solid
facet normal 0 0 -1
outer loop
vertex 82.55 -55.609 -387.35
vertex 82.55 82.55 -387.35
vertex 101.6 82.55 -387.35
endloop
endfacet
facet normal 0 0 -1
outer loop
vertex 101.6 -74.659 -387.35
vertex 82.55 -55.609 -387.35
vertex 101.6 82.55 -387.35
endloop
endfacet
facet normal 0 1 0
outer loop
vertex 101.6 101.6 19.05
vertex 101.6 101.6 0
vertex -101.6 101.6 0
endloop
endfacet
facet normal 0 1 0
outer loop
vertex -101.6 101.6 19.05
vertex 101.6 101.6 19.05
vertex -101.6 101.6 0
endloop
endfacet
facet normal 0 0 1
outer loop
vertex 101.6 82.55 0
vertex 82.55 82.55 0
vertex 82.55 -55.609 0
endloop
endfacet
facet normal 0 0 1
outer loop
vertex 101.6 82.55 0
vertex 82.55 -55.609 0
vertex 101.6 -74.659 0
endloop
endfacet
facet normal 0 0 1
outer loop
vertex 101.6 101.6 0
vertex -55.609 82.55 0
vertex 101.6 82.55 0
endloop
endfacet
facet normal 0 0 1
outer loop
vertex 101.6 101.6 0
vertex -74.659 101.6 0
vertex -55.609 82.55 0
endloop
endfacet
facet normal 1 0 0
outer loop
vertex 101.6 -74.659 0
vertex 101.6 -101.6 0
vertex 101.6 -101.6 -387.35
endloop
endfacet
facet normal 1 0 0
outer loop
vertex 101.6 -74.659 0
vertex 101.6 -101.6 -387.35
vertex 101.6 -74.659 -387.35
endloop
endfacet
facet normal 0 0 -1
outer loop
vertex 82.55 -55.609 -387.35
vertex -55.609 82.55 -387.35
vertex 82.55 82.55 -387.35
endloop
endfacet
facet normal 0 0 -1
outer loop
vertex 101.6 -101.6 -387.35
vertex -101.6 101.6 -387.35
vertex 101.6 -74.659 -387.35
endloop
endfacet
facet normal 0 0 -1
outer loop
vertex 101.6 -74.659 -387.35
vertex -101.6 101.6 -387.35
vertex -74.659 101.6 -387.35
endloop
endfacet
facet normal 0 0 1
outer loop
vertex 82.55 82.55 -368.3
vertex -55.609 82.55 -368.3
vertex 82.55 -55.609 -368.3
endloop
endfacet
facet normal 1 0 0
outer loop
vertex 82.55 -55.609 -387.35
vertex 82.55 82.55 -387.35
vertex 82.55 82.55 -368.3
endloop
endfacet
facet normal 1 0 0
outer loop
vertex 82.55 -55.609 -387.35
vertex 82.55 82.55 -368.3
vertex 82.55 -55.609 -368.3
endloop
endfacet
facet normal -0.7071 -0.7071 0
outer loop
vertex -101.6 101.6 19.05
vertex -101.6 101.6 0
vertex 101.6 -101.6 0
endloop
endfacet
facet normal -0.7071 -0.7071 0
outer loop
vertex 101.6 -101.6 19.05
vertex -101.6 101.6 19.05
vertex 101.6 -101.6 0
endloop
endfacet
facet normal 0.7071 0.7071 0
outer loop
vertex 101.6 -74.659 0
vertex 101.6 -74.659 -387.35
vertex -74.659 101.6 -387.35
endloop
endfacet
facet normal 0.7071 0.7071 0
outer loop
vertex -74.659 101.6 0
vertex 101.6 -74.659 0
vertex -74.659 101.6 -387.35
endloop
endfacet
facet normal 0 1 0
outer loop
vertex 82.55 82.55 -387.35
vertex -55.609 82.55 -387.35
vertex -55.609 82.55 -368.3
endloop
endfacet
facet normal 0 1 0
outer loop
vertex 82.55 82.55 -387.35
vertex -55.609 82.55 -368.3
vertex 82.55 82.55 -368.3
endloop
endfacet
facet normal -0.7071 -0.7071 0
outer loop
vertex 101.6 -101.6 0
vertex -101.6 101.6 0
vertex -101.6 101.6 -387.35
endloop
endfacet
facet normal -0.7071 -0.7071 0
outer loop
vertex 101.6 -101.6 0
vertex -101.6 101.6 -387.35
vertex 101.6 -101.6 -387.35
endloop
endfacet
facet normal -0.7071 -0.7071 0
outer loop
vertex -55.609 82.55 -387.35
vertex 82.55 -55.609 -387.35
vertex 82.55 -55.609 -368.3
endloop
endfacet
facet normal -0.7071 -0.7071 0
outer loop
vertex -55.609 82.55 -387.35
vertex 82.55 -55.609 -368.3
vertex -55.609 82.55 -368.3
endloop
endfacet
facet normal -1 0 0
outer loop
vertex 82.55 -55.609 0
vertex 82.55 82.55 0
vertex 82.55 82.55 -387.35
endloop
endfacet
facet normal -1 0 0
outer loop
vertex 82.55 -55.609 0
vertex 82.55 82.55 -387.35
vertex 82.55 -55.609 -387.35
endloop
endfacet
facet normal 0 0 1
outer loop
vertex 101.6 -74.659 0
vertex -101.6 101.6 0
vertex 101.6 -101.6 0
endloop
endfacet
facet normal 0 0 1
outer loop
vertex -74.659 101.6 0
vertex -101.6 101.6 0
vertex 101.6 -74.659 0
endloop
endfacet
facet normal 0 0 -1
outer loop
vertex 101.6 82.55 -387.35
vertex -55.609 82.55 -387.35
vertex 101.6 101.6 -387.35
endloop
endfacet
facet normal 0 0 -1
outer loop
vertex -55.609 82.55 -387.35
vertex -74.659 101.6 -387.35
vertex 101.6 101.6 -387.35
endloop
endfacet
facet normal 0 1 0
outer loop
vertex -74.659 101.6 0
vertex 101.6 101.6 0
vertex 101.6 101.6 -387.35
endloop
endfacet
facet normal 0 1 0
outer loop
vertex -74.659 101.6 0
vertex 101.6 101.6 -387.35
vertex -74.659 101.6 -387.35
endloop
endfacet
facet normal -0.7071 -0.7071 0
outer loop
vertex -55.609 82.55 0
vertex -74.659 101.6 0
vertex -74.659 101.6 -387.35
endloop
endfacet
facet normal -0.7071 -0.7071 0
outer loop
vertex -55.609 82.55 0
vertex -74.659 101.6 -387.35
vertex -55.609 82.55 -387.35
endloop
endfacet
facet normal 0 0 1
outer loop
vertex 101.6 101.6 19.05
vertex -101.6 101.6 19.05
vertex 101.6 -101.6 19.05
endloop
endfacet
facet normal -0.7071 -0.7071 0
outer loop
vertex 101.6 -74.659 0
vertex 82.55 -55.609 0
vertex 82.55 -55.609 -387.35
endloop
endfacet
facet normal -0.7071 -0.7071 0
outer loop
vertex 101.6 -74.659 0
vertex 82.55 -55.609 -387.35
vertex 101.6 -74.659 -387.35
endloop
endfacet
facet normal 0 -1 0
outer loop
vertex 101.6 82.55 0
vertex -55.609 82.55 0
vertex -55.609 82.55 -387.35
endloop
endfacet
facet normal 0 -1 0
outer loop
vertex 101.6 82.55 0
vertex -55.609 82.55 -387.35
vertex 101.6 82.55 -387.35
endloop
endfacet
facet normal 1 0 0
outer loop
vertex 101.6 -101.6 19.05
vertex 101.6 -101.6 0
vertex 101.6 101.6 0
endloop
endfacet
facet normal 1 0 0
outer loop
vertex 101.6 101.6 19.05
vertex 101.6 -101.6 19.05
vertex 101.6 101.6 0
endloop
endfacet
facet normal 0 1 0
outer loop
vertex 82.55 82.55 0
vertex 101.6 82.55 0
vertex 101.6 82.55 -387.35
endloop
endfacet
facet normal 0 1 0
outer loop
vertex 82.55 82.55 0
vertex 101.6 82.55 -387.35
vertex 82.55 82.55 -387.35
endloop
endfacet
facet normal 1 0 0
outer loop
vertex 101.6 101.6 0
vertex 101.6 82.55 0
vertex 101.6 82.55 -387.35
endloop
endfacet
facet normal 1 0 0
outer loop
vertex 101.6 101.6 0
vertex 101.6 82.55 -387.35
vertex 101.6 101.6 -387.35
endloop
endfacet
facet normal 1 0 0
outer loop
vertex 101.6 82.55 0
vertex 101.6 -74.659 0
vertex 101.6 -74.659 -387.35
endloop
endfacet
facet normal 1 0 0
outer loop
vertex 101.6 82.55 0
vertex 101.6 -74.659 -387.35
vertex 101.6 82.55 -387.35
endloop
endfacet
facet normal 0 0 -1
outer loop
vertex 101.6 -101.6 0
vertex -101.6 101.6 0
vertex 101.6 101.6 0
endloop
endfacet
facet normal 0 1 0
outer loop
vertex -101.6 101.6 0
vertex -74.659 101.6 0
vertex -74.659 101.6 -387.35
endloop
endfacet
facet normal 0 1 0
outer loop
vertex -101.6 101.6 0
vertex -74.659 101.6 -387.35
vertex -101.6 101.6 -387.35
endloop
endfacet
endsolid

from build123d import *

# Parameters (mm, degrees)
F1_DEPTH = 387.35
F2_DEPTH = 387.35
F3_DEPTH = 387.35
F4_DEPTH = 19.05
F6_DEPTH = 19.05


with BuildPart() as f1:
    # F0 (on Top) → F1 (new body)
    with BuildSketch(Plane.XY):
        Polygon((-55.6092316368, 82.55), (-74.6592316368, 101.6), (-101.6, 101.6), (101.6, -101.6), (101.6, -74.6592316368), (82.55, -55.6092316368), align=None)
    extrude(amount=-F1_DEPTH)


with BuildPart() as f2:
    # F0 (on Top) → F2 (new body)
    with BuildSketch(Plane.XY):
        Polygon((101.6, 82.55), (101.6, 101.6), (-74.6592316368, 101.6), (-55.6092316368, 82.55), (82.55, 82.55), align=None)
    extrude(amount=-F2_DEPTH)


with BuildPart() as f3:
    # F0 (on Top) → F3 (new body)
    with BuildSketch(Plane.XY):
        Polygon((101.6, -74.6592316368), (101.6, 82.55), (82.55, 82.55), (82.55, -55.6092316368), align=None)
    extrude(amount=-F3_DEPTH)


with BuildPart() as f4:
    # F0 (on Top) → F4 (new body)
    with BuildSketch(Plane.XY):
        Polygon((101.6, 82.55), (101.6, 101.6), (-74.6592316368, 101.6), (-55.6092316368, 82.55), (82.55, 82.55), align=None)
        Polygon((-55.6092316368, 82.55), (-74.6592316368, 101.6), (-101.6, 101.6), (101.6, -101.6), (101.6, -74.6592316368), (82.55, -55.6092316368), align=None)
        Polygon((82.55, 82.55), (-55.6092316368, 82.55), (82.55, -55.6092316368), align=None)
        Polygon((101.6, -74.6592316368), (101.6, 82.55), (82.55, 82.55), (82.55, -55.6092316368), align=None)
    extrude(amount=F4_DEPTH)


with BuildPart() as f6:
    # F5 (on face) → F6 (new body)
    with BuildSketch(Plane(origin=(0, 0, -387.35), x_dir=(1, 0, 0), z_dir=(0, 0, -1))):
        Polygon((82.55, -82.55), (82.55, 55.6092316368), (-55.6092316368, -82.55), align=None)
    extrude(amount=-F6_DEPTH)


solid = Compound([f1.part, f2.part, f3.part, f4.part, f6.part])
